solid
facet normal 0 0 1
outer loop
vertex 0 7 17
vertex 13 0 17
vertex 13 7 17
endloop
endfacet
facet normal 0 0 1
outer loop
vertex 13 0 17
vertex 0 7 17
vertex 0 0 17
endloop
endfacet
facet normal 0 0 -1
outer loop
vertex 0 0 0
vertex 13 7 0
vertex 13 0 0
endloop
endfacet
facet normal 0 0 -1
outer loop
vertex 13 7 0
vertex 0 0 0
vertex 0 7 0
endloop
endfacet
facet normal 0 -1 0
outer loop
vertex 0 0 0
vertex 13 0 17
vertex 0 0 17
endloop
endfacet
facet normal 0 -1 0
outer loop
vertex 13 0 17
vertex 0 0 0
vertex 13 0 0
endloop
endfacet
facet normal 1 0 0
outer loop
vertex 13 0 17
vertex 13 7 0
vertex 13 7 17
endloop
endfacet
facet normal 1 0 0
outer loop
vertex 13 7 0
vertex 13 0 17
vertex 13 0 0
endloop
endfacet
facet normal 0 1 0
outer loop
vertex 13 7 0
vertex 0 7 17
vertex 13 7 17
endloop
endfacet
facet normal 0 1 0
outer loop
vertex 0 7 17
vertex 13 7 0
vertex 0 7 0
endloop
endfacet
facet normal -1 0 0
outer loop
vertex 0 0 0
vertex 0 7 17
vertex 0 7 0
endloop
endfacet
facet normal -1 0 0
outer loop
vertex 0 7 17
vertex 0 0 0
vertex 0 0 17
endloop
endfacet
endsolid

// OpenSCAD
// Generated by SolidPython 1.0.1 on 2020-07-29 00:46:55


cube(size = [13, 7, 17]);
/***********************************************
*********      SolidPython code:      **********
************************************************
 
# import packages: SolidPython
from solid import *
from solid.utils import *
from itertools import chain, combinations, permutations


class Resize:

    def __init__(self, scad_file):
        self.scad_file = scad_file
        #self.scad_file = import_scad(scad_file)
        # cone/cylinder param:
        self.r1 = 0
        self.r2 = 0
        self.h = 0
        # rectangular prism param:
        self.w = 0
        self.l = 0
        # ellipse param:
        self.r = 0

    # import OpenScad code (file name corresponds to shape)


    # classify shape + parameters
    def assign(self, param1, param2, param3):
        if self.scad_file == 'cone.scad':
            self.r1 = param1
            self.r2 = param2
            self.h = param3
        elif self.scad_file == 'cylinder.scad':
            self.r1 = param1
            self.r2 = param2
            self.h = param3
        elif self.scad_file == 'rectangularPrism.scad':
            self.h = param1
            self.l = param2
            self.w = param3
        else:
            self.r = param1
            self.h = param2

    # resize parameters
    def iterate(self):
        x = range(3, 20, 2)
        i = 1
        if self.scad_file == 'cone.scad':
            tempList = list(permutations(x, 2))
            for temp in tempList:
                param1 = temp[0]
                param2 = temp[1]
                filepath = 'produced_scad_files/' + 'cone' + str(param1) + '_' + str(param2) + '_' + '.scad'
                scad_render_to_file(cylinder(h=param1, r1=param2, r2=0), filepath)

        elif self.scad_file == 'cylinder.scad':
            tempList = list(permutations(x, 3))
            for temp in tempList:
                param1 = temp[0]
                param2 = temp[1]
                filepath = 'produced_scad_files/' + 'cylinder' + str(param1) + '_' + str(param2) + '_' + '.scad'
                scad_render_to_file(cylinder(h=param1, r1=param2, r2=param2), filepath)

        elif self.scad_file == 'rectangularPrism.scad':
            tempList = list(permutations(x, 3))
            for temp in tempList:
                param1 = temp[0]
                param2 = temp[1]
                param3 = temp[2]
                filepath = 'produced_scad_files/' + 'rectangularPrism' + str(param1) + '_' + str(param2) + '_' + str(
                    param3) + '.scad'
                scad_render_to_file(cube(size=(param1, param2, param3)), filepath)

        elif self.scad_file == 'ellipse.scad':
            tempList = list(permutations(x, 4))
            for temp in tempList:
                param1 = temp[0]
                param2 = temp[1]
                param3 = temp[2]
                param4 = temp[3]
                filepath = 'produced_scad_files/' + 'ellipse' + str(param1) + '_' + str(param2) + '_' + str(param3) + '_' + str(param4) + '.scad'
                scad_render_to_file(scale([param1, param2, param3])(sphere(r=param4)), filepath)

    def render_to_scadfile(self):
        scad_render_to_file(scad, 'example.scad') 
 
************************************************/
